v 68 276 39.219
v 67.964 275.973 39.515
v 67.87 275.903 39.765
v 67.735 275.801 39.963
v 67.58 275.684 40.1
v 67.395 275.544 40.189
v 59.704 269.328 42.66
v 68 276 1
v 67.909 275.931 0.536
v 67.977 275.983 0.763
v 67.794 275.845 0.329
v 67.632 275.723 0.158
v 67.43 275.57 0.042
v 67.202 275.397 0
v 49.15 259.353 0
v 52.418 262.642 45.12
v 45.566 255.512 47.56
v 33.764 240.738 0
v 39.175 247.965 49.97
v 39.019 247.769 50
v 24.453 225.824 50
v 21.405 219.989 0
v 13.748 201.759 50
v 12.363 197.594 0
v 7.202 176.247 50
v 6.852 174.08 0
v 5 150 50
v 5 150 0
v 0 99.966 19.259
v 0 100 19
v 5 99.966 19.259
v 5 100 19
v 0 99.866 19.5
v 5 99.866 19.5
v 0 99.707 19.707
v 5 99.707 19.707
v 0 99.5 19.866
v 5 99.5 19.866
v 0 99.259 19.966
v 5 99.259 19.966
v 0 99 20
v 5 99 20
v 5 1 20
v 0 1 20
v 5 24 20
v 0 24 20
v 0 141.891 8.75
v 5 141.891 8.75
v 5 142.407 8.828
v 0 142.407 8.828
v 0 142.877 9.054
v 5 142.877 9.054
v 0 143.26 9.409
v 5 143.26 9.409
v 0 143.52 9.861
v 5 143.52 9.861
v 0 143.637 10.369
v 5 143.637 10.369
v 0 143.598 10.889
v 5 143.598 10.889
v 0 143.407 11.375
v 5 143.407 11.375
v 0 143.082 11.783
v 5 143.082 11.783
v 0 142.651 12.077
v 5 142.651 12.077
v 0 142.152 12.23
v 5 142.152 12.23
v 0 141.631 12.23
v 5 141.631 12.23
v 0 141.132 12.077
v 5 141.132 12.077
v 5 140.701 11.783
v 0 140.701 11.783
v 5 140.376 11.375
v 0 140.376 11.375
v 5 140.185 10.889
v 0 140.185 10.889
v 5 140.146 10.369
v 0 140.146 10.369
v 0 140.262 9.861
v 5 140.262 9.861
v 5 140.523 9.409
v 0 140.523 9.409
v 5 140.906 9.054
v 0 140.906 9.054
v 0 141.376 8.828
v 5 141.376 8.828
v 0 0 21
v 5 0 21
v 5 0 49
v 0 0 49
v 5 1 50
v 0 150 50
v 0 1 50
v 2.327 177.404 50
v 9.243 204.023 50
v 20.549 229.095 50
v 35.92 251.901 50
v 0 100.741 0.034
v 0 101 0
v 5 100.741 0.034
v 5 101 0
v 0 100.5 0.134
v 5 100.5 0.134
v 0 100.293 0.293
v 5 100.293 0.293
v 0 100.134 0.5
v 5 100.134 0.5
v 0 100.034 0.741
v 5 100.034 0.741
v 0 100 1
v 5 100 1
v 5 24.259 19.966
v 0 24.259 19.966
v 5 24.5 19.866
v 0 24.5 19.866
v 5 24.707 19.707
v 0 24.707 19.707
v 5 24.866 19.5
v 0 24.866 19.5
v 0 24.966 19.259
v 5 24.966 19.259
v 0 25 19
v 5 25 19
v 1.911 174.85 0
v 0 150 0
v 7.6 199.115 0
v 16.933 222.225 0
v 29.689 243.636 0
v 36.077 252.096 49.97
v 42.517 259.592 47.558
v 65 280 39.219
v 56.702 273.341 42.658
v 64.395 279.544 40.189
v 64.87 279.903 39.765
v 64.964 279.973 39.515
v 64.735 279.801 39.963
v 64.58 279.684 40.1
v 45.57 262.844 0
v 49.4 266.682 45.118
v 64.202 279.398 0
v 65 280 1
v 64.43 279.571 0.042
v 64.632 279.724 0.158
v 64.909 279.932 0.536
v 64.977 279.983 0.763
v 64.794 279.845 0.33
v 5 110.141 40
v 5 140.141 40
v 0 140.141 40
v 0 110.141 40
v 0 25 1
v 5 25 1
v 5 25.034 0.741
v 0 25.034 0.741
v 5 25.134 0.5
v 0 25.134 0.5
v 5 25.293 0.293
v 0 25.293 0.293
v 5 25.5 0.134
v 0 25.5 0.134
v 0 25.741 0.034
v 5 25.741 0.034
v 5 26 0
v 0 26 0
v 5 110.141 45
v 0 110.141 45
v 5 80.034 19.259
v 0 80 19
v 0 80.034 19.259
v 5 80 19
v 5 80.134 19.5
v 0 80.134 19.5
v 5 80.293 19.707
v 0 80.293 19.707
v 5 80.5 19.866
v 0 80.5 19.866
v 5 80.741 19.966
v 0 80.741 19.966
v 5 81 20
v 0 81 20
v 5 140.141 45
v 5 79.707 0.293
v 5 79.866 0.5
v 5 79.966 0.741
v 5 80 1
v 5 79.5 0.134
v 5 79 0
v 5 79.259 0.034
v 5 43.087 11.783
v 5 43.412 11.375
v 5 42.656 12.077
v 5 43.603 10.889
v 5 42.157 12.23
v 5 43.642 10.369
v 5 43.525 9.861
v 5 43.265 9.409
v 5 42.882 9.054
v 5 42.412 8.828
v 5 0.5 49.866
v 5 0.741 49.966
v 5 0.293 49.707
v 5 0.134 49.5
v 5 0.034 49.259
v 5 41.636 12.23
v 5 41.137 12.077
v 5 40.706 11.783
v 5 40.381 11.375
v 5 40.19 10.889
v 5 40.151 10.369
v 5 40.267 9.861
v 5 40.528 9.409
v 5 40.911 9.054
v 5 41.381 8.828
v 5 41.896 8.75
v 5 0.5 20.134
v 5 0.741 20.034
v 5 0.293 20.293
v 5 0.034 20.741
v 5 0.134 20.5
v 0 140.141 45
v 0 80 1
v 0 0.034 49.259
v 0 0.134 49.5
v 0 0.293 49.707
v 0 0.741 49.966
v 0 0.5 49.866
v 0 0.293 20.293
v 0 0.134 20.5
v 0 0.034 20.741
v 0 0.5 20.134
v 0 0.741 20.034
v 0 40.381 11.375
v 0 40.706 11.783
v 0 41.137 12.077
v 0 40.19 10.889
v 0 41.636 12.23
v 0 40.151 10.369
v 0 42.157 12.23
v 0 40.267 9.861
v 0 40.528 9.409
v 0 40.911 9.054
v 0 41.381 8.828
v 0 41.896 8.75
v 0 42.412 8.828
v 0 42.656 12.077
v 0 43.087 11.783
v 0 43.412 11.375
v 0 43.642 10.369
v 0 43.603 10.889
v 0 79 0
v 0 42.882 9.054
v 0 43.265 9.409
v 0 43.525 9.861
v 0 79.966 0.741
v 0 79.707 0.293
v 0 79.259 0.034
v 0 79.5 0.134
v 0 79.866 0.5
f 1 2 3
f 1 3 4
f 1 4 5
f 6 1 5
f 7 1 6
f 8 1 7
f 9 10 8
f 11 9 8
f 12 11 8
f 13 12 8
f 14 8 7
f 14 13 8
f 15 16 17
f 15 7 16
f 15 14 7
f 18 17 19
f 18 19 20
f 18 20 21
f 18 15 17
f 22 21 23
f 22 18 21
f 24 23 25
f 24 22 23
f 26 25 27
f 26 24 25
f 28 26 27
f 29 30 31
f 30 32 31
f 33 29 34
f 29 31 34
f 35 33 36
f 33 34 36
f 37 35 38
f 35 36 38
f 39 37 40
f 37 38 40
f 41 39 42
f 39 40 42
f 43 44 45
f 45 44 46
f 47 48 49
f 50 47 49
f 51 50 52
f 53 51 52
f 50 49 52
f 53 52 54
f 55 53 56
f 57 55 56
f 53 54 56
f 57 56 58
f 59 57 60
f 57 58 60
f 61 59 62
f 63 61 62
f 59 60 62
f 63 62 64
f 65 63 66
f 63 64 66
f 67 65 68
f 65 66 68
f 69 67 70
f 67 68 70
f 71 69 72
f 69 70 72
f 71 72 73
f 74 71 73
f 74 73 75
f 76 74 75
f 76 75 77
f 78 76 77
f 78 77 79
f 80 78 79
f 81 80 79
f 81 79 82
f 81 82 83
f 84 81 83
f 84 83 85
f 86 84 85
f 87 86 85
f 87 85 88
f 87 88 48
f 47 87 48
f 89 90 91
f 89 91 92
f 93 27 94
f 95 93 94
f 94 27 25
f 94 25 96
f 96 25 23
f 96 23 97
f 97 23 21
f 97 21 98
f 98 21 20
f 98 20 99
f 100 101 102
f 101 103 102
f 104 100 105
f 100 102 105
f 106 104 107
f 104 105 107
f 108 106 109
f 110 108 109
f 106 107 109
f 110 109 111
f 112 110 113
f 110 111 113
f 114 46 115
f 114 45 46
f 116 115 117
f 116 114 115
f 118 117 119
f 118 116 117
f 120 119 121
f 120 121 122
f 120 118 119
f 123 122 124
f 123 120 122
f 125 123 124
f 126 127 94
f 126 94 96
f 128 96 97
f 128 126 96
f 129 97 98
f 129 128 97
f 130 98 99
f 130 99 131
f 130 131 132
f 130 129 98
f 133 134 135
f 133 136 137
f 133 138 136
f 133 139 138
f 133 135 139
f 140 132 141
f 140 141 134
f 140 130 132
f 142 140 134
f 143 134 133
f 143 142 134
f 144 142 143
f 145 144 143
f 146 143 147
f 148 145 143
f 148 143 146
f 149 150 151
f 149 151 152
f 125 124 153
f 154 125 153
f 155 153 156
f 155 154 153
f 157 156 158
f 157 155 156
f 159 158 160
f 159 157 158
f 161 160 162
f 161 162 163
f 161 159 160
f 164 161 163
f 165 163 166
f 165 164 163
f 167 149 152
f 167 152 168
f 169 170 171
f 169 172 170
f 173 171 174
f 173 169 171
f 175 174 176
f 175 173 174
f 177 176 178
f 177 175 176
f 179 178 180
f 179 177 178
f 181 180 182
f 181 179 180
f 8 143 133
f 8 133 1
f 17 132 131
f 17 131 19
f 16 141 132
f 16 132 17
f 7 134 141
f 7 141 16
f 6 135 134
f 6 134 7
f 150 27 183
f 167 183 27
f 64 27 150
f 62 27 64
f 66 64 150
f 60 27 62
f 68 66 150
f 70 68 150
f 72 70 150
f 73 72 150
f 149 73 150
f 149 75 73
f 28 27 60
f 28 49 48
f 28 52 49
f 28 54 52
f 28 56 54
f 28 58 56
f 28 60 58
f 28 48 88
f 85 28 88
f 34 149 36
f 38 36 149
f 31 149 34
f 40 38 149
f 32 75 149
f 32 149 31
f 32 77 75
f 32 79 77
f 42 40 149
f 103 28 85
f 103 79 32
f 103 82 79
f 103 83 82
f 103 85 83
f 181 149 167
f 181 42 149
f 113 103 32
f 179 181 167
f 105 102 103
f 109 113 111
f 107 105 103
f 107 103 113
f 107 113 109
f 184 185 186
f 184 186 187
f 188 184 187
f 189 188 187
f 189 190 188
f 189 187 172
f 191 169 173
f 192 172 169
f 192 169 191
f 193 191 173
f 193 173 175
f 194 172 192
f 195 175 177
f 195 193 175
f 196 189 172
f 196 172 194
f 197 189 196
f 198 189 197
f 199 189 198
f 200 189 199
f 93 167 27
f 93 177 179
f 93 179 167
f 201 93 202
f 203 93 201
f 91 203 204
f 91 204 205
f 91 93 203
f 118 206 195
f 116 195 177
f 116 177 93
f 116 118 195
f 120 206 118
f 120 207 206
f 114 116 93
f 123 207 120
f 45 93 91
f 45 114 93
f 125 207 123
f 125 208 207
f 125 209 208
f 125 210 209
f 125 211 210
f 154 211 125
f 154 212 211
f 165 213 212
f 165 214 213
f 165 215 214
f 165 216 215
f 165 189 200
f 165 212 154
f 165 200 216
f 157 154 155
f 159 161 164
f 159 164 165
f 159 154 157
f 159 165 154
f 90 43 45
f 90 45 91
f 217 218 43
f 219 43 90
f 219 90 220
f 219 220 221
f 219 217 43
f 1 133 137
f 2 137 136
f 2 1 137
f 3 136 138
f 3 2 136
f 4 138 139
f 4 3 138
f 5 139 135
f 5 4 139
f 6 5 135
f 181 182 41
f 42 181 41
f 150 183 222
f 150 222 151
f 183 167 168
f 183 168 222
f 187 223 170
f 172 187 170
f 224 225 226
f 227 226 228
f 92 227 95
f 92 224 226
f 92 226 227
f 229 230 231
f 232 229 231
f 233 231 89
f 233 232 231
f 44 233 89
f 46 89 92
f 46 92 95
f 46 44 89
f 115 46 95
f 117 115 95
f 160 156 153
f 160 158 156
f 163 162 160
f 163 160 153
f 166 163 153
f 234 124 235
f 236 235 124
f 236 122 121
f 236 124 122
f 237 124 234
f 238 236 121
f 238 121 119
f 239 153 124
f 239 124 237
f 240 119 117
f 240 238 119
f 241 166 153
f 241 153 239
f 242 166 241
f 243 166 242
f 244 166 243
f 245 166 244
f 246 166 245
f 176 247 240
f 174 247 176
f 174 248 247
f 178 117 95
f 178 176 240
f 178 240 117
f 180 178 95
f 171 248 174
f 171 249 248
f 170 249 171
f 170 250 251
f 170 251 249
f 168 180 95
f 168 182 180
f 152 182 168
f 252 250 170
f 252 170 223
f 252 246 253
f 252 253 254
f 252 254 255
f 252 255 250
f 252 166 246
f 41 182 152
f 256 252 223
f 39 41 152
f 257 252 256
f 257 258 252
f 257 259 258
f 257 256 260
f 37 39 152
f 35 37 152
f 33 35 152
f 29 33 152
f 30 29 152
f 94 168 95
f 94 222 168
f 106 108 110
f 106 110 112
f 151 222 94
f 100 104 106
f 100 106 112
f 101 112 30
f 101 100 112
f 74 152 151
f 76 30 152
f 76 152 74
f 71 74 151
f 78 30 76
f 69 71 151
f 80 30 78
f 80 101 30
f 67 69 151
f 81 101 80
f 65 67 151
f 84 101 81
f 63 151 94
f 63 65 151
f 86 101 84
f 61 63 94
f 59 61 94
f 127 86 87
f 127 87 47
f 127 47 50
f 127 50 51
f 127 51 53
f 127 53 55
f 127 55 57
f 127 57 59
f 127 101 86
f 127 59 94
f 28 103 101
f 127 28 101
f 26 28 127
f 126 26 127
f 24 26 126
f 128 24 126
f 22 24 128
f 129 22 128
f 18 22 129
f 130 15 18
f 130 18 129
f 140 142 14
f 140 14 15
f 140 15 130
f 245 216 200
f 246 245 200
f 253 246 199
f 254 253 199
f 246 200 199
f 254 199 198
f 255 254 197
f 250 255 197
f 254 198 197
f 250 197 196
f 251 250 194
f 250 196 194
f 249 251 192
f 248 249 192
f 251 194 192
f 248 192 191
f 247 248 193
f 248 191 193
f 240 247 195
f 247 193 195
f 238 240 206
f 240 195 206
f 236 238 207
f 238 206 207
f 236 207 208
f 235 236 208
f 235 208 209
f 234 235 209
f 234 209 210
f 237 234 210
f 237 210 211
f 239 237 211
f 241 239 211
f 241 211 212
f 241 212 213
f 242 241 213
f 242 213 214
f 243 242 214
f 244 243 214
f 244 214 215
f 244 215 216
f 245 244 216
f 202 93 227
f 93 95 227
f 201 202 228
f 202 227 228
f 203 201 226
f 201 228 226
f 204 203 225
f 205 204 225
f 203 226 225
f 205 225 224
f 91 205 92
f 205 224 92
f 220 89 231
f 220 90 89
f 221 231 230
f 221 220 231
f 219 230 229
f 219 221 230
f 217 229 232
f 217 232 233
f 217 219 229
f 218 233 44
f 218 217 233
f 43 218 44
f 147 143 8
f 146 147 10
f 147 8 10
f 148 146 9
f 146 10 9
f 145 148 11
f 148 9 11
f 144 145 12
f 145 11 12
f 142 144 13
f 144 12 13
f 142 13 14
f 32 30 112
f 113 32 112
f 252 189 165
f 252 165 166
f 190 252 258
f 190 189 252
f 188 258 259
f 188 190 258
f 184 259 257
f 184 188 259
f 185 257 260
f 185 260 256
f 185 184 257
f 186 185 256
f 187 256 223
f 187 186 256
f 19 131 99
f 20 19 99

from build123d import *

# Parameters (mm, degrees)
BASE_FLANGE2_DEPTH = 50
SKETCH14_R         = 1.7500000000000004
CUT_EXTRUDE1_DEPTH = 10
CUT_EXTRUDE2_DEPTH = 10
CHAMFER1_SIZE      = 40
CHAMFER1_SIZE2     = 10
FILLET1_R          = 1
CUT_EXTRUDE3_DEPTH = 10


# Sheet-metal steps are written as plain solids
with BuildPart() as part:
    # Sketch13 → Base-Flange2 (new body)
    with BuildSketch(Plane.XY):
        with BuildLine():
            Line((0, 0), (0, 150))
            ThreePointArc((0, 150), (17.155581462513624, 222.67220926874307), (64.99999999999997, 279.99999999999994))
            Line((64.99999999999997, 279.99999999999994), (67.99999999999997, 275.99999999999994))
            ThreePointArc((67.99999999999997, 275.99999999999994), (21.627717417513225, 220.4361412912433), (5, 150))
            Line((5, 150), (5, 0))
            Line((5, 0), (0, 0))
        make_face()
    extrude(amount=BASE_FLANGE2_DEPTH)

    # Sketch14 → Cut-Extrude1 (cut)
    with BuildSketch(Plane(origin=(5, 0, 0), x_dir=(0, 0, -1), z_dir=(1, 0, 0))):
        with Locations((-10.500030729924669, 141.8914274868206)):
            Circle(SKETCH14_R)
        with Locations((-10.500008780040803, 41.896427486823015)):
            Circle(SKETCH14_R)
    extrude(amount=-CUT_EXTRUDE1_DEPTH, mode=Mode.SUBTRACT)

    # Sketch15 → Cut-Extrude2 (cut)
    with BuildSketch(Plane.ZY):
        Polygon((0, 0), (20.000000000000004, 0), (19.999999999999996, 25), (0, 25), align=None)
        Polygon((6.94e-15, 80), (20.000000000000007, 80), (20.000000000000004, 100), (0, 100), align=None)
    extrude(amount=-CUT_EXTRUDE2_DEPTH, mode=Mode.SUBTRACT)

    # Chamfer1
    chamfer1_edges = [part.edges().sort_by_distance(p)[0] for p in [
        (66.49999999999997, 277.99999999999994, 50),
    ]]
    chamfer1_side = [part.faces().sort_by_distance(p)[0] for p in [
        (2.88138855415232, 75, 50),
    ]]
    chamfer(chamfer1_edges, length=CHAMFER1_SIZE, length2=CHAMFER1_SIZE2, reference=chamfer1_side[0])

    # Fillet1
    fillet1_edges = [part.edges().sort_by_distance(p)[0] for p in [
        (2.5, 0, 50),
        (2.5, 80, 6.94e-15),
        (2.5, 100, 0),
        (2.5, 25, 0),
        (2.5, 25, 19.999999999999996),
        (2.5, 0, 20.000000000000004),
        (2.5, 100, 20.000000000000004),
        (2.5, 80, 20.000000000000007),
        (66.49999999999997, 277.99999999999994, 0),
        (66.49999999999996, 277.99999999999994, 40),
        (37.54920679025358, 249.93439094632848, 50),
    ]]
    fillet(fillet1_edges, radius=FILLET1_R)

    # Sketch16 → Cut-Extrude3 (cut)
    with BuildSketch(Plane(origin=(5, 0, 0), x_dir=(0, 0, -1), z_dir=(1, 0, 0))):
        Polygon((-40, 140.1414274868206), (-40.00000000000002, 110.1414274868206), (-45.000000000000014, 110.1414274868206), (-45, 140.1414274868206), align=None)
    extrude(amount=-CUT_EXTRUDE3_DEPTH, mode=Mode.SUBTRACT)


solid = part.part
